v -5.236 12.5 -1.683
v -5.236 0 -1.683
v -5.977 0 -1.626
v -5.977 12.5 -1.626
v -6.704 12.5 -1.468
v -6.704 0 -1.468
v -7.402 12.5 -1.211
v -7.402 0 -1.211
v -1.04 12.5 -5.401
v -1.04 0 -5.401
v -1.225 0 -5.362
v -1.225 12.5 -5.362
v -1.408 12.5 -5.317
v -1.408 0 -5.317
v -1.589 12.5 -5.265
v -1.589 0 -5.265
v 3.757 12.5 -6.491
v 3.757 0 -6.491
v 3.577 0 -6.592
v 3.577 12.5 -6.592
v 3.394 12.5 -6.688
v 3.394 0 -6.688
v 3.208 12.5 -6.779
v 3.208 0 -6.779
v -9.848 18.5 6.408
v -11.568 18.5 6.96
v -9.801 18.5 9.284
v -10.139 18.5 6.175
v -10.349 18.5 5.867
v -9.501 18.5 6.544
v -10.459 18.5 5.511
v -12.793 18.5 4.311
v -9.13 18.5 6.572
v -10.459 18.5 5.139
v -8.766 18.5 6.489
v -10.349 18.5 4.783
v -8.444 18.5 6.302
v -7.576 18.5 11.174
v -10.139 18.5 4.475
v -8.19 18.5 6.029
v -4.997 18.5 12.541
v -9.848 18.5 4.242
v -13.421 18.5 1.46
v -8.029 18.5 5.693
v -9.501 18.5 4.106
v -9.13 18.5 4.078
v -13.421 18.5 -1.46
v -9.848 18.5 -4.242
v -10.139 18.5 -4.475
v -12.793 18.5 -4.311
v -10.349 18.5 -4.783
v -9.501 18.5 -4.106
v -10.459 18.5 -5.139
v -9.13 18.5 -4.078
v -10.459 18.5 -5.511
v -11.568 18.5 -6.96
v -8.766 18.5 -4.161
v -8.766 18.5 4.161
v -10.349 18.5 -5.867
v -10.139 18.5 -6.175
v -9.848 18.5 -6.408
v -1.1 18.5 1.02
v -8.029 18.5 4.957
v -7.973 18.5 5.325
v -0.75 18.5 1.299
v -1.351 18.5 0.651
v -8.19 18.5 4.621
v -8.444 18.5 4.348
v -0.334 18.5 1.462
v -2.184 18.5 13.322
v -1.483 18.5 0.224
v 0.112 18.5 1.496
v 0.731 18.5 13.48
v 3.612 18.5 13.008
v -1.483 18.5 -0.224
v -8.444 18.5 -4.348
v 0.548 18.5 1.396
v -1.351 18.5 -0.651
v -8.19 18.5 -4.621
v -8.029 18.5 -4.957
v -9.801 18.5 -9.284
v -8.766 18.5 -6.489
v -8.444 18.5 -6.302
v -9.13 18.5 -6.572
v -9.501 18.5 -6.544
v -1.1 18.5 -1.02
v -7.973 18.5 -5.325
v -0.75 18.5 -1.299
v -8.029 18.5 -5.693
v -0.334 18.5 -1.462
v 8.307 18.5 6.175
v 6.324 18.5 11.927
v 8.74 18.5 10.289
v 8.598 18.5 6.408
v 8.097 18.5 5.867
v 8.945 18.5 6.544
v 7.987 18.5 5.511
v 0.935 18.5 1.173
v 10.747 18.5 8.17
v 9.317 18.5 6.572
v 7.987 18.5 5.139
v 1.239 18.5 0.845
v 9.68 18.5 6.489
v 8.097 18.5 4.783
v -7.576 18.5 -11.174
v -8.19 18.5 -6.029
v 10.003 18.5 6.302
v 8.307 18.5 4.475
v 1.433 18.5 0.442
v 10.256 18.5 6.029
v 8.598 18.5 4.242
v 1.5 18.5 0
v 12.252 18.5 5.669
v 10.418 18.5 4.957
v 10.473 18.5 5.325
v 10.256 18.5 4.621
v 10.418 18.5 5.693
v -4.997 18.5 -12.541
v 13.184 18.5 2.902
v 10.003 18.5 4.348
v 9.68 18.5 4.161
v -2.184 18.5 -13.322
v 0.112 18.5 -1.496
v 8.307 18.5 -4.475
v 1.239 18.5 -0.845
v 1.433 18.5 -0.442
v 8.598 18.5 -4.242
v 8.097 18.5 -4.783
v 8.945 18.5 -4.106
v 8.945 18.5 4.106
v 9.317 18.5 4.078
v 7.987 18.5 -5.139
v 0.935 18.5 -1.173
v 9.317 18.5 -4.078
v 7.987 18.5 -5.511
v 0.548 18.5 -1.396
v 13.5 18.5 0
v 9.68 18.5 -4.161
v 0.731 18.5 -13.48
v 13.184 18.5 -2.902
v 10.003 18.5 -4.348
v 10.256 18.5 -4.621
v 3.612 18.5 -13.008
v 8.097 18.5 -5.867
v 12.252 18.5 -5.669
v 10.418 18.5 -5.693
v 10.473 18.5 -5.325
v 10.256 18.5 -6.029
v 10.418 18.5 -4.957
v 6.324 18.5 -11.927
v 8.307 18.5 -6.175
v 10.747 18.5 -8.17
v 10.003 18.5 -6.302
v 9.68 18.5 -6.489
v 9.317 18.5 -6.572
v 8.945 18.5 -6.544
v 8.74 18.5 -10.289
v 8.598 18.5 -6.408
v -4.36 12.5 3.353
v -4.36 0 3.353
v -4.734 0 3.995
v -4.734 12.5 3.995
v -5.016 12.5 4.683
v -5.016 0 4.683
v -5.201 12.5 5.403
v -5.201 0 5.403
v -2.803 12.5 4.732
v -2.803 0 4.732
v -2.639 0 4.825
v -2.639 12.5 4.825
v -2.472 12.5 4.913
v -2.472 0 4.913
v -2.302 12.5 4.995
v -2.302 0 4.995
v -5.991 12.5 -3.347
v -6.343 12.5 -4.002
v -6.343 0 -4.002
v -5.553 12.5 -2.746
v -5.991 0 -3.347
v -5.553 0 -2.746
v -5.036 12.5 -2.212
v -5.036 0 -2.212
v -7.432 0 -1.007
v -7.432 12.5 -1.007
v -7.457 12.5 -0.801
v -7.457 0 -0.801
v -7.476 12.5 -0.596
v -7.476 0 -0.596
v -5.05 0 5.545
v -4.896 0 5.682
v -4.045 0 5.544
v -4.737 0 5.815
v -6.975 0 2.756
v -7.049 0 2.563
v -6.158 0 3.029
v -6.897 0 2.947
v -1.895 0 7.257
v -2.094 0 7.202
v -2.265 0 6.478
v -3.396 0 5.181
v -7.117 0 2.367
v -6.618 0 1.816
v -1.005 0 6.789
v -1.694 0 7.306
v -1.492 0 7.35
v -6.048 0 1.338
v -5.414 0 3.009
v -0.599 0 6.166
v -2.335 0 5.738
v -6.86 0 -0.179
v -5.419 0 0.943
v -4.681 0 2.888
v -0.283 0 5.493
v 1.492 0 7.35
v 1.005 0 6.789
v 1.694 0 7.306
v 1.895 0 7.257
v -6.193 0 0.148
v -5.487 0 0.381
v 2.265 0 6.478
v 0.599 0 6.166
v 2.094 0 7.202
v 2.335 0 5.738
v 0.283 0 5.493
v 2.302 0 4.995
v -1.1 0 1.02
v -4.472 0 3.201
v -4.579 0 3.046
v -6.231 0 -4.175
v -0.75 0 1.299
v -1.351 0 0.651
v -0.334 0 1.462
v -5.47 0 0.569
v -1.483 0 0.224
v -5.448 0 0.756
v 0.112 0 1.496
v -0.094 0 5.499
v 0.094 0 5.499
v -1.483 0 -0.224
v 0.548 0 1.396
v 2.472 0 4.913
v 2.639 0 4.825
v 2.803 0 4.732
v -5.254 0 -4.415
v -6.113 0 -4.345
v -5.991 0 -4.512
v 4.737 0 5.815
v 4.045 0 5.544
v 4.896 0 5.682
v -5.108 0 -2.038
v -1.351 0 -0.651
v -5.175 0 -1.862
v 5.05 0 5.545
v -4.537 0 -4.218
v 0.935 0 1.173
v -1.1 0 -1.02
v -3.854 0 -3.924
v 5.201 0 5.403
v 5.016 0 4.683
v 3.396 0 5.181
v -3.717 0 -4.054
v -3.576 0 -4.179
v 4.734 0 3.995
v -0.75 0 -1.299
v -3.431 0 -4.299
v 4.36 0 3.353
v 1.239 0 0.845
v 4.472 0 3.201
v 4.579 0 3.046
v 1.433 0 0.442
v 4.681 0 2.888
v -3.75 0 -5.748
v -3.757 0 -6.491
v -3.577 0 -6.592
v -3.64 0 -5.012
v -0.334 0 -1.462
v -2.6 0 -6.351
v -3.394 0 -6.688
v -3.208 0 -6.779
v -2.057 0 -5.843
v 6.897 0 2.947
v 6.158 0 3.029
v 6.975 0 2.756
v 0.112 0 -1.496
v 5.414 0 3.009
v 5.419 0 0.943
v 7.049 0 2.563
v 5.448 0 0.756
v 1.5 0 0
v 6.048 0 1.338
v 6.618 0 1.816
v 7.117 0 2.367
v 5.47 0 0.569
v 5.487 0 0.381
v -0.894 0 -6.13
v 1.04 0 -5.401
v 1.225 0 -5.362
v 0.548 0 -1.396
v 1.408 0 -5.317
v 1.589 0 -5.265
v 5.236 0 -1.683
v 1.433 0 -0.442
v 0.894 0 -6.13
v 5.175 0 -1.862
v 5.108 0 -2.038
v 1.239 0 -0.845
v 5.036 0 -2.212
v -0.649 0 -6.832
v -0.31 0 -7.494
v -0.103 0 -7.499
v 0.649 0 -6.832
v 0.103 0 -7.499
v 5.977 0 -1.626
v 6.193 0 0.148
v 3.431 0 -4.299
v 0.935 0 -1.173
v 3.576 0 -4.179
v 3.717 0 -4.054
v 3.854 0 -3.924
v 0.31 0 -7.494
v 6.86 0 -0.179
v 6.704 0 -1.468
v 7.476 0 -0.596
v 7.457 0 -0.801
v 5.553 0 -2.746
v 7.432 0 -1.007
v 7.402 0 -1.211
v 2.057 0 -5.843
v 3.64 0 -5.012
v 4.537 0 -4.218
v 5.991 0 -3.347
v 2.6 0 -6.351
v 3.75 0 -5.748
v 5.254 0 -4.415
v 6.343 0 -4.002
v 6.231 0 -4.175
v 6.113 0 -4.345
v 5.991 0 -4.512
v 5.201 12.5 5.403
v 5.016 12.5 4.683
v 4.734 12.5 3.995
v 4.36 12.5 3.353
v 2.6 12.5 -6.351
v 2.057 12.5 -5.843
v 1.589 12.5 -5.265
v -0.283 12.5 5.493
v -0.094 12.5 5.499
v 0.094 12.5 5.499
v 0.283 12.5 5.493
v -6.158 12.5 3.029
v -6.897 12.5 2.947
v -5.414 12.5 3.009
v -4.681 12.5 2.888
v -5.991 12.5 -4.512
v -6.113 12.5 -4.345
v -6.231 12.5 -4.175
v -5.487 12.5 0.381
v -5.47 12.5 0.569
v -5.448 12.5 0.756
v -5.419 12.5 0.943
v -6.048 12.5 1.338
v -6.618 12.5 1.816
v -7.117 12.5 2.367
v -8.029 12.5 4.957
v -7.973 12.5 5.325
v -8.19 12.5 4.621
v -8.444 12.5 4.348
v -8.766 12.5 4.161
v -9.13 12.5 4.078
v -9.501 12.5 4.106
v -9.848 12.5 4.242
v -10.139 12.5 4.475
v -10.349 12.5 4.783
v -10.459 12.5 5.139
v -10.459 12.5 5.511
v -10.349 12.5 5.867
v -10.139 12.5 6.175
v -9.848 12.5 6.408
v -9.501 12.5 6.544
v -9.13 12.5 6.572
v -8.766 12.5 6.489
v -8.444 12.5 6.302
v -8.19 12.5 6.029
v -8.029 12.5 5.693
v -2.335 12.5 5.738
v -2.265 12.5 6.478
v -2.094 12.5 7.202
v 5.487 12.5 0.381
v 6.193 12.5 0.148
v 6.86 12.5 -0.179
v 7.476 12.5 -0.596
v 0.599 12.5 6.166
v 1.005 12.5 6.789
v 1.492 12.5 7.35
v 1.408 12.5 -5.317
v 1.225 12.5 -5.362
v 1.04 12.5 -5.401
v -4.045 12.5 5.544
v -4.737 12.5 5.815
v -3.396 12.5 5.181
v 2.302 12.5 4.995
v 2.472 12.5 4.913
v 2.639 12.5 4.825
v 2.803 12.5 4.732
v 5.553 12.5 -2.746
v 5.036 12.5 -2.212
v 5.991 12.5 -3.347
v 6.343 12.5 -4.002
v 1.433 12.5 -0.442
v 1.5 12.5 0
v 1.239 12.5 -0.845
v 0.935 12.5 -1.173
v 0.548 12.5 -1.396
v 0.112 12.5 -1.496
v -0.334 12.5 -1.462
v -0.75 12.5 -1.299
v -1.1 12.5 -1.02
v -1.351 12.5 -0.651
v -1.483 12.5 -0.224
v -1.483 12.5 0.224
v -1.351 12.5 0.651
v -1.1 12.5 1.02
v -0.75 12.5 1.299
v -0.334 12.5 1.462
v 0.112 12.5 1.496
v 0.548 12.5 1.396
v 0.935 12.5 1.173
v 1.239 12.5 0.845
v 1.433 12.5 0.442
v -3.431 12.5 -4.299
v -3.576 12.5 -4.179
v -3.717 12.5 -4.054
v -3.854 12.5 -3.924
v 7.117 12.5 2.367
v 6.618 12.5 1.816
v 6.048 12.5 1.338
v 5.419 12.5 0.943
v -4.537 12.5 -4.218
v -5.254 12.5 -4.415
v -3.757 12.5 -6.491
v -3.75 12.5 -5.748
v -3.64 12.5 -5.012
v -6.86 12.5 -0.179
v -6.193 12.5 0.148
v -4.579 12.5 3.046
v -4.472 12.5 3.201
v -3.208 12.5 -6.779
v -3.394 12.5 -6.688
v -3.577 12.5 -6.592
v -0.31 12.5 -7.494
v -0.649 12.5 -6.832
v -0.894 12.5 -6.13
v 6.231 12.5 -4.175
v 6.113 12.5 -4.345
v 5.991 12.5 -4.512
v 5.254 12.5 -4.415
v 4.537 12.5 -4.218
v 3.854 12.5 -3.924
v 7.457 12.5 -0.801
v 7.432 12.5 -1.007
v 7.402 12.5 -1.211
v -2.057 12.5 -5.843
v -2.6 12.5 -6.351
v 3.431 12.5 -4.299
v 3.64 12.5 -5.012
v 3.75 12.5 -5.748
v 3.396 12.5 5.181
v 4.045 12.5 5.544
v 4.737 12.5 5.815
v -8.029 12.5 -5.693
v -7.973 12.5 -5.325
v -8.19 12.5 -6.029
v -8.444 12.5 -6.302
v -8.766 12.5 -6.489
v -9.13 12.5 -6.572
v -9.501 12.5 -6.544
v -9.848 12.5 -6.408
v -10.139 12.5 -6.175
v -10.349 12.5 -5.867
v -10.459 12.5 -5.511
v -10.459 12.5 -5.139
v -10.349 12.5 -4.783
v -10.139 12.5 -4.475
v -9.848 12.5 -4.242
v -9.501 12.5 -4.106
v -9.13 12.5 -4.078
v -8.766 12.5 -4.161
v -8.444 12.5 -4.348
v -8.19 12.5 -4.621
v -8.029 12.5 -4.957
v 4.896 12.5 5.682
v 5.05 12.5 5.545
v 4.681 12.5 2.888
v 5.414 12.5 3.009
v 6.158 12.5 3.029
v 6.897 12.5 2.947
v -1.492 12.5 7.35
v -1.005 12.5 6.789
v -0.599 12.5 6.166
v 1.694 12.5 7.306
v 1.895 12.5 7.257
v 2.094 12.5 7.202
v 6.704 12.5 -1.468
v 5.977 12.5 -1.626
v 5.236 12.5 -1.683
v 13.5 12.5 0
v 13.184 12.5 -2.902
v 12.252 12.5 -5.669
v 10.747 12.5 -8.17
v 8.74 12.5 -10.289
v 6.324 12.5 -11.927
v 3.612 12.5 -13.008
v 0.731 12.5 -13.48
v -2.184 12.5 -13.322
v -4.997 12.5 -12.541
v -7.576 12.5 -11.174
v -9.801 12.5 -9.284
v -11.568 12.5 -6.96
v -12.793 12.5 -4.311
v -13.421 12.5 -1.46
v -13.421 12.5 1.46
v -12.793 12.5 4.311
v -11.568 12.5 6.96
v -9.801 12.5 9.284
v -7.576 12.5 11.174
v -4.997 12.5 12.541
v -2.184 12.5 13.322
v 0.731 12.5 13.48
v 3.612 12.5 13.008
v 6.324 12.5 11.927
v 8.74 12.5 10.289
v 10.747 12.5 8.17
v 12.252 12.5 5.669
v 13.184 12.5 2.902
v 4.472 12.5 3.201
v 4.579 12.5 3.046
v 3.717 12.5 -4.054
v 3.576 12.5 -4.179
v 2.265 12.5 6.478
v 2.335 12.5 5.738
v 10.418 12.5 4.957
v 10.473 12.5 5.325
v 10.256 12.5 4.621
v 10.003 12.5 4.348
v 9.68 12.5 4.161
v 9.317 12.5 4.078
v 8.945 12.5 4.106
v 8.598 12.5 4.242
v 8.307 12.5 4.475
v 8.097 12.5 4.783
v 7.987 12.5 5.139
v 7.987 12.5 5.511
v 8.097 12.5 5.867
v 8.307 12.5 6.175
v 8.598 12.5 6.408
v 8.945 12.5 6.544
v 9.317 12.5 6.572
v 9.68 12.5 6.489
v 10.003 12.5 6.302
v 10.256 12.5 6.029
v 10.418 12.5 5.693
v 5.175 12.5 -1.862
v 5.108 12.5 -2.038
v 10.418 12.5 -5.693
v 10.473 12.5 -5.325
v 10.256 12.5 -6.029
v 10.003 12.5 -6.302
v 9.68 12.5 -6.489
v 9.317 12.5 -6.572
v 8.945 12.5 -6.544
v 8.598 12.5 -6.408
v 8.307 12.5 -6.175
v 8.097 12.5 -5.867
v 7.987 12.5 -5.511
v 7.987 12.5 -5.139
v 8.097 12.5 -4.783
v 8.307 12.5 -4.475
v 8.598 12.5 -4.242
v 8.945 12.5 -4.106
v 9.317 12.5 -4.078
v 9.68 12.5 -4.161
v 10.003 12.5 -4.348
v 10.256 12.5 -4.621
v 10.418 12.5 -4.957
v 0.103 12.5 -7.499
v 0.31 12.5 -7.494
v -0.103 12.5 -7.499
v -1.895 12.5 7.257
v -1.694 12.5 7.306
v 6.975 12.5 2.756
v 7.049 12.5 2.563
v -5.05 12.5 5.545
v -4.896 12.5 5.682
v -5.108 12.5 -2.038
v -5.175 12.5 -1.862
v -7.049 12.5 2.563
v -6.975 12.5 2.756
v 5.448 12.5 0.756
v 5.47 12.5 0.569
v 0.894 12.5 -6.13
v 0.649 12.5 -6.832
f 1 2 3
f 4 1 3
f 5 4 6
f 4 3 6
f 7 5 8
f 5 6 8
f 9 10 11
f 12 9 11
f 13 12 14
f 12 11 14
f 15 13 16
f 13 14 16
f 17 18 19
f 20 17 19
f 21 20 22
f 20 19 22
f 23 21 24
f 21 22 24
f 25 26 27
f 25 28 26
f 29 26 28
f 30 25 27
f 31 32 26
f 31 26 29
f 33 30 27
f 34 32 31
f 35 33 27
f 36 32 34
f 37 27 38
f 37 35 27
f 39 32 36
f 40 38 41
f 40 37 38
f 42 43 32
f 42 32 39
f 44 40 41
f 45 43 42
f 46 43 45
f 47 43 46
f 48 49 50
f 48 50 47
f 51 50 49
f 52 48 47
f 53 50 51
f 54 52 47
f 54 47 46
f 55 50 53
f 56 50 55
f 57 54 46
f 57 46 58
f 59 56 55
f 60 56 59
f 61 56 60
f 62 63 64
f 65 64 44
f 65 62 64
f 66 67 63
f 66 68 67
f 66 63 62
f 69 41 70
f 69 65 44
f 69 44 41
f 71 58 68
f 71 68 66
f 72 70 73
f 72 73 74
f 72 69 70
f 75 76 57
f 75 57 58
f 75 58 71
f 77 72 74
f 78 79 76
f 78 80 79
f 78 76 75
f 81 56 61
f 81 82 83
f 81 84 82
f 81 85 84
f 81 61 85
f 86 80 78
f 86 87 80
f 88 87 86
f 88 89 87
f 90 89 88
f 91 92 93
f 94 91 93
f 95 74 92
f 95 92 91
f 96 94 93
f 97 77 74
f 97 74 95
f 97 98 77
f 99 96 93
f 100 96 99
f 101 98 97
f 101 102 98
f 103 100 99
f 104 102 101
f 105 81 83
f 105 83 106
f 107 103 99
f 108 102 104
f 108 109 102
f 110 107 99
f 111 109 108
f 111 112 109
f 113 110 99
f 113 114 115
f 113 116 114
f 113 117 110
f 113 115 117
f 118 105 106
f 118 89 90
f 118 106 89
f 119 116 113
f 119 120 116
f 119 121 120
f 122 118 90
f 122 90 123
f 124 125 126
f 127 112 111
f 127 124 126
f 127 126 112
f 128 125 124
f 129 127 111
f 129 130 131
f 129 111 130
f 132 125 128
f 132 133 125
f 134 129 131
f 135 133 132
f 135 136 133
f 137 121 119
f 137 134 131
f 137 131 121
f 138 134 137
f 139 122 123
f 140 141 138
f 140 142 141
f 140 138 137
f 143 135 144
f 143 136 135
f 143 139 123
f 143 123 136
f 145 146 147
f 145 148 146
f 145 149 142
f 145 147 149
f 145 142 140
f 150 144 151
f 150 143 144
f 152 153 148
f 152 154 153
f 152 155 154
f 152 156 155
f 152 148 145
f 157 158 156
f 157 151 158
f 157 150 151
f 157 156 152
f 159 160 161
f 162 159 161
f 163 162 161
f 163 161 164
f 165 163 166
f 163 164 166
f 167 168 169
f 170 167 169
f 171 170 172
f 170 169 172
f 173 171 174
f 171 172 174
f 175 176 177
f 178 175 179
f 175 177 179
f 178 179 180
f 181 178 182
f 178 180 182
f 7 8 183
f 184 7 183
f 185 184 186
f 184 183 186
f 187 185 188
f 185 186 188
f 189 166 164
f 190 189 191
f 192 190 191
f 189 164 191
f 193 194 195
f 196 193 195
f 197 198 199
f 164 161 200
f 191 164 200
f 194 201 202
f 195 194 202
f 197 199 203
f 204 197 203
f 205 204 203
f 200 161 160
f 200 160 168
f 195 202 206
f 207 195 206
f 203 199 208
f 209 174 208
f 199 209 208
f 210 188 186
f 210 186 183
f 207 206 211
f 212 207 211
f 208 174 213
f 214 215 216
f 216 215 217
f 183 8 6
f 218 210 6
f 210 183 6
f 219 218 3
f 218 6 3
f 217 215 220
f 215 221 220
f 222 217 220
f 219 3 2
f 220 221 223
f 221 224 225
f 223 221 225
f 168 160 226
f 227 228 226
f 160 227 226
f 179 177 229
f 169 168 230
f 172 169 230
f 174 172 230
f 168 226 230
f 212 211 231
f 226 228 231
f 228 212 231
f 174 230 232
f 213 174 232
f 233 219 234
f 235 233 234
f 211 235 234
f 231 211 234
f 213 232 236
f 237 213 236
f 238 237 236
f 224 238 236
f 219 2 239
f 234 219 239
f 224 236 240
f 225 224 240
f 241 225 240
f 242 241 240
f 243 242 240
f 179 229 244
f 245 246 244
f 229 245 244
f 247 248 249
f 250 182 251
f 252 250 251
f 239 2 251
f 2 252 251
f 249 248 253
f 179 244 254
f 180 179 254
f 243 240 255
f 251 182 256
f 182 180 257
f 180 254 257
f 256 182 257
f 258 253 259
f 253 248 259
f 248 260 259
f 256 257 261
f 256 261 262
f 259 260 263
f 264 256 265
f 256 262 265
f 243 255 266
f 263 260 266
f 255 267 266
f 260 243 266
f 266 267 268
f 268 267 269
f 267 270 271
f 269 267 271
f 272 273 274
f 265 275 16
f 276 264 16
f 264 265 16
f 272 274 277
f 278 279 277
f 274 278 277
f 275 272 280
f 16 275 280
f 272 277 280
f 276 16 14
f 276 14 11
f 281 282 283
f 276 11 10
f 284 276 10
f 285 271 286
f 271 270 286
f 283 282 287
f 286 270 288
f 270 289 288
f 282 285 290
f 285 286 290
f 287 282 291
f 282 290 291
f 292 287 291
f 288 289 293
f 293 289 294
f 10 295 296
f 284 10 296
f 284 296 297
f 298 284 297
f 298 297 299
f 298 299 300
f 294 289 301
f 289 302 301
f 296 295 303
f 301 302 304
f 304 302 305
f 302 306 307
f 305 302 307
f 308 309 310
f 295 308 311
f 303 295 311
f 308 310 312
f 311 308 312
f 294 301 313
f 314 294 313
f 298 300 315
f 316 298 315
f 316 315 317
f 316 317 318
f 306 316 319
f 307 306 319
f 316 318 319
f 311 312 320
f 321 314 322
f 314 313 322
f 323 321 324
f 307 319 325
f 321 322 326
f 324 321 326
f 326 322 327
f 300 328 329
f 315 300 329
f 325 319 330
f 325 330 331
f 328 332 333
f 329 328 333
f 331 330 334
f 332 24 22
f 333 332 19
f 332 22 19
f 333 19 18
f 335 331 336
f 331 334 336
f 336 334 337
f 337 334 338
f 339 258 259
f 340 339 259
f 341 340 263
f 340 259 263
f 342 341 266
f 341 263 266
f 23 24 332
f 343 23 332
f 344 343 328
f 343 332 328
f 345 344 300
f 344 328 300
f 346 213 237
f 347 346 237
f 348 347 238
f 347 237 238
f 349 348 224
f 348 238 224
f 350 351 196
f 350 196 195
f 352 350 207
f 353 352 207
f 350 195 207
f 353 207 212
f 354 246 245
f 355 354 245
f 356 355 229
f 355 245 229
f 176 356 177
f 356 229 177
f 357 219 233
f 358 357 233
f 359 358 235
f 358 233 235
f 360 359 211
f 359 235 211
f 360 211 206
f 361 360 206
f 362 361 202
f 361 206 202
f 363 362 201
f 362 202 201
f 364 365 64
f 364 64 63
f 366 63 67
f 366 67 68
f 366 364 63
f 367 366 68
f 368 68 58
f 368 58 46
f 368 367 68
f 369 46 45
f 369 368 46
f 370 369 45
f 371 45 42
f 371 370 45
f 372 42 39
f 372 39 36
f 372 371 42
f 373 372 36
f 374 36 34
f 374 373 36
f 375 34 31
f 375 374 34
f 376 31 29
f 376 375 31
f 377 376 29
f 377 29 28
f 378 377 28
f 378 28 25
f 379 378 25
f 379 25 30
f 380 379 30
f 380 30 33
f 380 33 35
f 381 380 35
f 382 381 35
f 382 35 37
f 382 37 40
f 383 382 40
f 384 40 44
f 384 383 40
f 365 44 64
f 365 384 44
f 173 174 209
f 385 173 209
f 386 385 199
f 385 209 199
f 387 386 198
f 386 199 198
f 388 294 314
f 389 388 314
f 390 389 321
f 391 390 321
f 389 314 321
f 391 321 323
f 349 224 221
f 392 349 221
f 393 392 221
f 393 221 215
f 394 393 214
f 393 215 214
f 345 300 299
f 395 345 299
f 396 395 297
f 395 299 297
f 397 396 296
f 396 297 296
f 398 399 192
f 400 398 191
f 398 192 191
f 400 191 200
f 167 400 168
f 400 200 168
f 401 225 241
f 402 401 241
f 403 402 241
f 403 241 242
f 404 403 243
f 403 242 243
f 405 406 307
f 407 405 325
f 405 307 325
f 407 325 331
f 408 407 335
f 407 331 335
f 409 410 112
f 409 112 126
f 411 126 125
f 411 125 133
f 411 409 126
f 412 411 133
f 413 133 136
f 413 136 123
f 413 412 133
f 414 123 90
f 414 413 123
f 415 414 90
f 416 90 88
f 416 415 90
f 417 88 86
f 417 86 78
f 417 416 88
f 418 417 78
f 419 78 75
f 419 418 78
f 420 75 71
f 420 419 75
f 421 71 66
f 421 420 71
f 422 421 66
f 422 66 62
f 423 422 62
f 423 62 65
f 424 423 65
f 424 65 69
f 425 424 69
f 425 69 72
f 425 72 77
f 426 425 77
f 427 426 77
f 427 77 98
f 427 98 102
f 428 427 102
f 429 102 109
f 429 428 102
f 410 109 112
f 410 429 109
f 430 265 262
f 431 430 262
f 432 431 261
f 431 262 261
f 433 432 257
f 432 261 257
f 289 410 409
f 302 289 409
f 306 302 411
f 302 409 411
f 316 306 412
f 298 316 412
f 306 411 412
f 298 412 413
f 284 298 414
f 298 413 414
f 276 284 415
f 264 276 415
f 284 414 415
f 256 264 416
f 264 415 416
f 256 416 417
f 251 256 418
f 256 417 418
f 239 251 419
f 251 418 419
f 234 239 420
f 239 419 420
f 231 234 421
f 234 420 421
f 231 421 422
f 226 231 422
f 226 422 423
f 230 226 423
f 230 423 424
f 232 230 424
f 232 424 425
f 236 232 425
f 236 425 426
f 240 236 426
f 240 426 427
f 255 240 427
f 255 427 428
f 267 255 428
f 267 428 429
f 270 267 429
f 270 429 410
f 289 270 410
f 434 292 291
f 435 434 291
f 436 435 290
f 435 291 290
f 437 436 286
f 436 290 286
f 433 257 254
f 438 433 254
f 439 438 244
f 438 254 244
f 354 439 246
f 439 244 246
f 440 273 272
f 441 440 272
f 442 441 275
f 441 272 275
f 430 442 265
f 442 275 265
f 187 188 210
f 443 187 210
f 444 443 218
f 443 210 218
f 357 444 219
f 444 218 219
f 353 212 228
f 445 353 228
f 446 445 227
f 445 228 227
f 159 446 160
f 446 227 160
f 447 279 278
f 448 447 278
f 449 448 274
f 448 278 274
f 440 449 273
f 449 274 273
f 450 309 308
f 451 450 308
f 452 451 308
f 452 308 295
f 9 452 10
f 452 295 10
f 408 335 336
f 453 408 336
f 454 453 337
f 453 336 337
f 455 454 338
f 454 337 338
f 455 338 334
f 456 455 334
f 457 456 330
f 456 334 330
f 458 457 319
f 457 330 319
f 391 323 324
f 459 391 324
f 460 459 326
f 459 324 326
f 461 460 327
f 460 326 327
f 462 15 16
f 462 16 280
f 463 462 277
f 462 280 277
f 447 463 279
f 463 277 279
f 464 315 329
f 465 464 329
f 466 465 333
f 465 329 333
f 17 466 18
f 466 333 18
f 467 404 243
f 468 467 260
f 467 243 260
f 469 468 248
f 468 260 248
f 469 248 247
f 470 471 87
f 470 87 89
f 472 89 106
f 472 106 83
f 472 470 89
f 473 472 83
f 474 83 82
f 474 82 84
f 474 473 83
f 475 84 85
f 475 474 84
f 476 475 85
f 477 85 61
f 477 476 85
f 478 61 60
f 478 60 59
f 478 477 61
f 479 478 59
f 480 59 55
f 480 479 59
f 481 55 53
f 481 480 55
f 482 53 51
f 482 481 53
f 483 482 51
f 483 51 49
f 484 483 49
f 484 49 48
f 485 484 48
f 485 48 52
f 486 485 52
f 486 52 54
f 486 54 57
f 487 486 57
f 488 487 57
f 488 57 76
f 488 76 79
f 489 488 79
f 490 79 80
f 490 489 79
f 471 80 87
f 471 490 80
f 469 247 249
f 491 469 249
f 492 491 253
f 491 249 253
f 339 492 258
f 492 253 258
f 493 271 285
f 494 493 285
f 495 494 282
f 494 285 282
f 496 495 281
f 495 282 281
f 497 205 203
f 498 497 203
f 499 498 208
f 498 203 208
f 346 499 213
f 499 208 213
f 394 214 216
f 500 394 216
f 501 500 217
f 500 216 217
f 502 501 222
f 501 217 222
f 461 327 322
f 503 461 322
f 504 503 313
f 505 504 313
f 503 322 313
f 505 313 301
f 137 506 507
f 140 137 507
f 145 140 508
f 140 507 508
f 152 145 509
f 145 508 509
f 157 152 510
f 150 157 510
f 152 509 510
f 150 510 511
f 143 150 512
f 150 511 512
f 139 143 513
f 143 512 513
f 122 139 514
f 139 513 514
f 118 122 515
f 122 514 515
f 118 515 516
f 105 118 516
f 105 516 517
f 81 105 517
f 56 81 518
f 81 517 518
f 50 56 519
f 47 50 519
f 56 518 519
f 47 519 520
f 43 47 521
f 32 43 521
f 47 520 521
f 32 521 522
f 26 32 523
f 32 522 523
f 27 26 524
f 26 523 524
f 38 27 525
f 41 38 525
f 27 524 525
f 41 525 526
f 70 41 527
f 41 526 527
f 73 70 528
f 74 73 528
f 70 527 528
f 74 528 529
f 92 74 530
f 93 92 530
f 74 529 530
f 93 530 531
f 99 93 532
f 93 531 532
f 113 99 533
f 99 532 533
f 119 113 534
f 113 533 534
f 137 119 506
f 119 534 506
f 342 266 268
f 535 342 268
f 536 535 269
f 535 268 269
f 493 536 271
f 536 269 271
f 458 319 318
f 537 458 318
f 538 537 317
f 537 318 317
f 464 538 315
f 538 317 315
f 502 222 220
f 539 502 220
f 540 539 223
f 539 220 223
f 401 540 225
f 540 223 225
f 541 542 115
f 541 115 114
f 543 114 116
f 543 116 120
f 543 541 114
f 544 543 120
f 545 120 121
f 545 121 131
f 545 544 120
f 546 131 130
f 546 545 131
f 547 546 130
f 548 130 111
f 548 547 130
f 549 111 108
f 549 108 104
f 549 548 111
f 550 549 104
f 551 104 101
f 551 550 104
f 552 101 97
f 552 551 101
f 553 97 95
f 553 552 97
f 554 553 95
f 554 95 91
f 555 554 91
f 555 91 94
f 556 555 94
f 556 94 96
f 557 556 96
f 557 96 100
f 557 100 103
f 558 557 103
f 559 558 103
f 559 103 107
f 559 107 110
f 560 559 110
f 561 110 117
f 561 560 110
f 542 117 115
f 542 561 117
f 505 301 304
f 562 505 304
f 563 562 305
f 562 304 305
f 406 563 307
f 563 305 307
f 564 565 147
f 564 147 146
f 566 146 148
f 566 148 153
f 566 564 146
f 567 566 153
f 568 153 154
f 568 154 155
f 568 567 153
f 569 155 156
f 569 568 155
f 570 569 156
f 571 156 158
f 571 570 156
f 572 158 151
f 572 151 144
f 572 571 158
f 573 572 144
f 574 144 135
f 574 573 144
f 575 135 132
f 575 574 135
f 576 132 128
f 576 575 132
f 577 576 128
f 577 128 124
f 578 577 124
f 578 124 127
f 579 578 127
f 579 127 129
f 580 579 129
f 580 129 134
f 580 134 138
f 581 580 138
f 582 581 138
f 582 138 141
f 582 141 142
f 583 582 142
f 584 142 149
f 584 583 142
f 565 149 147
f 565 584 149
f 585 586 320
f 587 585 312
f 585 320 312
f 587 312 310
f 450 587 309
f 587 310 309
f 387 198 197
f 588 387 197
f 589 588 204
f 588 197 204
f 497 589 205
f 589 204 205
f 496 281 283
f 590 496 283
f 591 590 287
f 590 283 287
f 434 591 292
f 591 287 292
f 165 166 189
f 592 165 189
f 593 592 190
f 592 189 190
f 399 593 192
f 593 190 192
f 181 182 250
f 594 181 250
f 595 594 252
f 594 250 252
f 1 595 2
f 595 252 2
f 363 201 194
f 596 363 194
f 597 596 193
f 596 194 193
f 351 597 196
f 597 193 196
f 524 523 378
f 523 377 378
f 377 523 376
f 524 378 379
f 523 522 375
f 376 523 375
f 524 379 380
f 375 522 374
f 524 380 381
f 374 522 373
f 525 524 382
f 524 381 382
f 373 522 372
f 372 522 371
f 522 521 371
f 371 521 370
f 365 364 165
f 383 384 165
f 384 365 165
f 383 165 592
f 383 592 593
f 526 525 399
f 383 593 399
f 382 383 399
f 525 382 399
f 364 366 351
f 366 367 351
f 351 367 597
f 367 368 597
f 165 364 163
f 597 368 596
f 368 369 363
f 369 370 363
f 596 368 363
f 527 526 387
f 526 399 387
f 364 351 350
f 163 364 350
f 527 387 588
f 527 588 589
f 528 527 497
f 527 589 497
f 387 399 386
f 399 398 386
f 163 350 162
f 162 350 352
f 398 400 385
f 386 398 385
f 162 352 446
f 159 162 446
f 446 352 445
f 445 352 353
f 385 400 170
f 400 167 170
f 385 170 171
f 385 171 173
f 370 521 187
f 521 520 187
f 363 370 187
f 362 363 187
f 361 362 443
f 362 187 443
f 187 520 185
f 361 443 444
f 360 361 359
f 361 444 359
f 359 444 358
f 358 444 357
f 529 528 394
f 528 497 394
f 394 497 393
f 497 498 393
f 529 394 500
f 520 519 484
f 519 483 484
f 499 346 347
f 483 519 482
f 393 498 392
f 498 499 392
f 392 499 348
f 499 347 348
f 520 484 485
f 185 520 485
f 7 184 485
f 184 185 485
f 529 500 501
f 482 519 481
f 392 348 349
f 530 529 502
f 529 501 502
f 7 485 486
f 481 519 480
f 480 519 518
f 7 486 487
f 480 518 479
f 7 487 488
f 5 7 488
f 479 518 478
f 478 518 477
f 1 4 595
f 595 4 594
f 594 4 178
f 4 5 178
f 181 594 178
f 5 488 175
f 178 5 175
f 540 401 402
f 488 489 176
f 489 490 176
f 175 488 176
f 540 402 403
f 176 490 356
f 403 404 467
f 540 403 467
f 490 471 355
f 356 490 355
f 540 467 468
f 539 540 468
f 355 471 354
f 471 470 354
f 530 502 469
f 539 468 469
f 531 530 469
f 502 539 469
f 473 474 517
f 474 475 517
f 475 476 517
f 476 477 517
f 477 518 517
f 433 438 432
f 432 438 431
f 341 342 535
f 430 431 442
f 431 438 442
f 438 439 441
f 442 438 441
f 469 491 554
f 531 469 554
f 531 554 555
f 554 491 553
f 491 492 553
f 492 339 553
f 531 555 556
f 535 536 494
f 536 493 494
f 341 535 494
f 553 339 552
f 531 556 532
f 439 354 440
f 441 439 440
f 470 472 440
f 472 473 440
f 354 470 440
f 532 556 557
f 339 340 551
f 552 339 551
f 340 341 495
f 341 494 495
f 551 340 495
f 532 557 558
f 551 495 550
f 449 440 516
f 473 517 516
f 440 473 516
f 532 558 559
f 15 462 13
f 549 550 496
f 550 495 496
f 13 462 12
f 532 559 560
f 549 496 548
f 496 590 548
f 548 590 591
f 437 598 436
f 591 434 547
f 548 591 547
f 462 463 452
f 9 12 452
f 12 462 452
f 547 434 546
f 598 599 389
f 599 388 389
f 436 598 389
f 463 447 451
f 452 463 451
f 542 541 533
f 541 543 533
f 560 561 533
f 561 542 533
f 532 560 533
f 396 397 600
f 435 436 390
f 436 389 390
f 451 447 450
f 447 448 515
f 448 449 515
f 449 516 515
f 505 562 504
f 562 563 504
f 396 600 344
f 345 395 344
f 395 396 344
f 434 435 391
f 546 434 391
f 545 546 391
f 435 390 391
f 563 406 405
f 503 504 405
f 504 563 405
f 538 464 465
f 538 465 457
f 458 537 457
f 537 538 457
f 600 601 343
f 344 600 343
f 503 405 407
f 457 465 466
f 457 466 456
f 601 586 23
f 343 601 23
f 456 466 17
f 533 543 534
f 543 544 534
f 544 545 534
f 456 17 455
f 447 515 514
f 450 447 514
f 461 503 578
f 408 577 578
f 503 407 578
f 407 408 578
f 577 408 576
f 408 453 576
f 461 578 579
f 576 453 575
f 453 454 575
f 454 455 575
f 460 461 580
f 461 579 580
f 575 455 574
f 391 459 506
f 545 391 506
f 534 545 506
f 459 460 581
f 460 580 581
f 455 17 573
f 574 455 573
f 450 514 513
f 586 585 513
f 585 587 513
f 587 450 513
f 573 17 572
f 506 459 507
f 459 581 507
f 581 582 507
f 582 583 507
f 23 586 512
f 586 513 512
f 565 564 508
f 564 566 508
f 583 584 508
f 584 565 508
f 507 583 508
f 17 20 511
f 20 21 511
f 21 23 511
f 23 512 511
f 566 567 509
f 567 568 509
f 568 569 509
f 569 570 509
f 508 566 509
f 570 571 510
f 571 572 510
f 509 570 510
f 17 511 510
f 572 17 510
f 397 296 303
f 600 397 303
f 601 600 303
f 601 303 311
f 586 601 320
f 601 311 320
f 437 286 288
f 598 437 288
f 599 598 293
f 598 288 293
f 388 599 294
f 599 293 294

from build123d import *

# Parameters (mm, degrees)
BOSS_EXTRUDE1_DEPTH      = 12.5
SKETCH2_R                = 1.5
CUT_EXTRUDE1_DEPTH       = 13.5
ESBO_O1_R                = 13.5
ESBO_O1_R_2              = 1.5
ESBO_O1_R_3              = 1.25
RESSALTO_EXTRUS_O1_DEPTH = 6


with BuildPart() as part:
    # Sketch1 → Boss-Extrude1 (new body)
    with BuildSketch(Plane(origin=(0, 0, 0), x_dir=(1, 0, 0), z_dir=(0, 1, 0))):
        with BuildLine():
            ThreePointArc((1.04, 5.400777722), (0.783531714, 6.485041414), (0.31, 7.493590595))
            ThreePointArc((0.31, 7.493590595), (0, 7.5), (-0.31, 7.493590595))
            ThreePointArc((-0.31, 7.493590595), (-0.783531714, 6.485041414), (-1.04, 5.400777722))
            ThreePointArc((-1.04, 5.400777722), (-1.316236154, 5.340179996), (-1.588992288, 5.265463276))
            ThreePointArc((-1.588992288, 5.265463276), (-2.319966139, 6.10634434), (-3.207953823, 6.779309129))
            ThreePointArc((-3.207953823, 6.779309129), (-3.48542379, 6.640920192), (-3.756936559, 6.491180762))
            ThreePointArc((-3.756936559, 6.491180762), (-3.707531894, 5.378093653), (-3.430740821, 4.298839078))
            ThreePointArc((-3.430740821, 4.298839078), (-3.64717462, 4.116809115), (-3.853965592, 3.923894649))
            ThreePointArc((-3.853965592, 3.923894649), (-4.891987708, 4.328757368), (-5.991004086, 4.511969642))
            ThreePointArc((-5.991004086, 4.511969642), (-6.172378994, 4.2604856), (-6.343204228, 4.001719645))
            ThreePointArc((-6.343204228, 4.001719645), (-5.782181198, 3.039089449), (-5.035540265, 2.212088208))
            ThreePointArc((-5.035540265, 2.212088208), (-5.142589335, 1.950326879), (-5.236041824, 1.683409046))
            ThreePointArc((-5.236041824, 1.683409046), (-6.343313848, 1.559504249), (-7.401587511, 1.210992284))
            ThreePointArc((-7.401587511, 1.210992284), (-7.445316556, 0.904025102), (-7.476320253, 0.595512782))
            ThreePointArc((-7.476320253, 0.595512782), (-6.532202472, 0.003866477), (-5.486758119, -0.381425412))
            ThreePointArc((-5.486758119, -0.381425412), (-5.459898808, -0.662951741), (-5.418603976, -0.942725282))
            ThreePointArc((-5.418603976, -0.942725282), (-6.341463231, -1.567012498), (-7.116556437, -2.367408811))
            ThreePointArc((-7.116556437, -2.367408811), (-7.01262182, -2.659536653), (-6.896701407, -2.947118882))
            ThreePointArc((-6.896701407, -2.947118882), (-5.785774881, -3.032242258), (-4.68102581, -2.887559066))
            ThreePointArc((-4.68102581, -2.887559066), (-4.526411262, -3.124356107), (-4.359829258, -3.352892609))
            ThreePointArc((-4.359829258, -3.352892609), (-4.886859811, -4.334545567), (-5.201208047, -5.403465078))
            ThreePointArc((-5.201208047, -5.403465078), (-4.973419937, -5.613830611), (-4.737131383, -5.814601127))
            ThreePointArc((-4.737131383, -5.814601127), (-3.713895991, -5.373700834), (-2.802926901, -4.732187738))
            ThreePointArc((-2.802926901, -4.732187738), (-2.555977446, -4.870008141), (-2.302270198, -4.994952646))
            ThreePointArc((-2.302270198, -4.994952646), (-2.312735701, -6.109086484), (-2.094325574, -7.201652615))
            ThreePointArc((-2.094325574, -7.201652615), (-1.794867482, -7.282063631), (-1.492341648, -7.350028327))
            ThreePointArc((-1.492341648, -7.350028327), (-0.791208287, -6.484109309), (-0.282711218, -5.492729228))
            ThreePointArc((-0.282711218, -5.492729228), (0, -5.5), (0.282711218, -5.492729228))
            ThreePointArc((0.282711218, -5.492729228), (0.791208287, -6.484109309), (1.492341648, -7.350028327))
            ThreePointArc((1.492341648, -7.350028327), (1.794867482, -7.282063631), (2.094325574, -7.201652615))
            ThreePointArc((2.094325574, -7.201652615), (2.312735701, -6.109086484), (2.302270198, -4.994952646))
            ThreePointArc((2.302270198, -4.994952646), (2.555977446, -4.870008141), (2.802926901, -4.732187738))
            ThreePointArc((2.802926901, -4.732187738), (3.713895991, -5.373700834), (4.737131383, -5.814601127))
            ThreePointArc((4.737131383, -5.814601127), (4.973419937, -5.613830611), (5.201208047, -5.403465078))
            ThreePointArc((5.201208047, -5.403465078), (4.886859811, -4.334545567), (4.359829258, -3.352892609))
            ThreePointArc((4.359829258, -3.352892609), (4.526411262, -3.124356107), (4.68102581, -2.887559066))
            ThreePointArc((4.68102581, -2.887559066), (5.785774881, -3.032242258), (6.896701407, -2.947118882))
            ThreePointArc((6.896701407, -2.947118882), (7.01262182, -2.659536653), (7.116556437, -2.367408811))
            ThreePointArc((7.116556437, -2.367408811), (6.341463231, -1.567012498), (5.418603976, -0.942725282))
            ThreePointArc((5.418603976, -0.942725282), (5.459898808, -0.662951741), (5.486758119, -0.381425412))
            ThreePointArc((5.486758119, -0.381425412), (6.532202472, 0.003866477), (7.476320253, 0.595512782))
            ThreePointArc((7.476320253, 0.595512782), (7.445316556, 0.904025102), (7.401587511, 1.210992284))
            ThreePointArc((7.401587511, 1.210992284), (6.343313848, 1.559504249), (5.236041824, 1.683409046))
            ThreePointArc((5.236041824, 1.683409046), (5.142589335, 1.950326879), (5.035540265, 2.212088208))
            ThreePointArc((5.035540265, 2.212088208), (5.782181198, 3.039089449), (6.343204228, 4.001719645))
            ThreePointArc((6.343204228, 4.001719645), (6.172378994, 4.2604856), (5.991004086, 4.511969642))
            ThreePointArc((5.991004086, 4.511969642), (4.891987708, 4.328757368), (3.853965592, 3.923894649))
            ThreePointArc((3.853965592, 3.923894649), (3.64717462, 4.116809115), (3.430740821, 4.298839078))
            ThreePointArc((3.430740821, 4.298839078), (3.707531894, 5.378093653), (3.756936559, 6.491180762))
            ThreePointArc((3.756936559, 6.491180762), (3.48542379, 6.640920192), (3.207953823, 6.779309129))
            ThreePointArc((3.207953823, 6.779309129), (2.319966139, 6.10634434), (1.588992288, 5.265463276))
            ThreePointArc((1.588992288, 5.265463276), (1.316236154, 5.340179996), (1.04, 5.400777722))
        make_face()
    extrude(amount=BOSS_EXTRUDE1_DEPTH)

    # Sketch2 → Cut-Extrude1 (cut, through all)
    with BuildSketch(Plane(origin=(0, 12.5, 0), x_dir=(1, 0, 0), z_dir=(0, 1, 0))):
        Circle(SKETCH2_R)
    extrude(amount=-CUT_EXTRUDE1_DEPTH, mode=Mode.SUBTRACT)

    # Esboço1 → Ressalto-extrusão1 (add)
    with BuildSketch(Plane(origin=(0, 12.5, 0), x_dir=(1, 0, 0), z_dir=(0, 1, 0))):
        Circle(ESBO_O1_R)
        Circle(ESBO_O1_R_2, mode=Mode.SUBTRACT)
        with Locations((9.22317055, 5.325)):
            Circle(ESBO_O1_R_3, mode=Mode.SUBTRACT)
        with Locations((9.22317055, -5.325)):
            Circle(ESBO_O1_R_3, mode=Mode.SUBTRACT)
        with Locations((-9.22317055, -5.325)):
            Circle(ESBO_O1_R_3, mode=Mode.SUBTRACT)
        with Locations((-9.22317055, 5.325)):
            Circle(ESBO_O1_R_3, mode=Mode.SUBTRACT)
    extrude(amount=RESSALTO_EXTRUS_O1_DEPTH)


solid = part.part
